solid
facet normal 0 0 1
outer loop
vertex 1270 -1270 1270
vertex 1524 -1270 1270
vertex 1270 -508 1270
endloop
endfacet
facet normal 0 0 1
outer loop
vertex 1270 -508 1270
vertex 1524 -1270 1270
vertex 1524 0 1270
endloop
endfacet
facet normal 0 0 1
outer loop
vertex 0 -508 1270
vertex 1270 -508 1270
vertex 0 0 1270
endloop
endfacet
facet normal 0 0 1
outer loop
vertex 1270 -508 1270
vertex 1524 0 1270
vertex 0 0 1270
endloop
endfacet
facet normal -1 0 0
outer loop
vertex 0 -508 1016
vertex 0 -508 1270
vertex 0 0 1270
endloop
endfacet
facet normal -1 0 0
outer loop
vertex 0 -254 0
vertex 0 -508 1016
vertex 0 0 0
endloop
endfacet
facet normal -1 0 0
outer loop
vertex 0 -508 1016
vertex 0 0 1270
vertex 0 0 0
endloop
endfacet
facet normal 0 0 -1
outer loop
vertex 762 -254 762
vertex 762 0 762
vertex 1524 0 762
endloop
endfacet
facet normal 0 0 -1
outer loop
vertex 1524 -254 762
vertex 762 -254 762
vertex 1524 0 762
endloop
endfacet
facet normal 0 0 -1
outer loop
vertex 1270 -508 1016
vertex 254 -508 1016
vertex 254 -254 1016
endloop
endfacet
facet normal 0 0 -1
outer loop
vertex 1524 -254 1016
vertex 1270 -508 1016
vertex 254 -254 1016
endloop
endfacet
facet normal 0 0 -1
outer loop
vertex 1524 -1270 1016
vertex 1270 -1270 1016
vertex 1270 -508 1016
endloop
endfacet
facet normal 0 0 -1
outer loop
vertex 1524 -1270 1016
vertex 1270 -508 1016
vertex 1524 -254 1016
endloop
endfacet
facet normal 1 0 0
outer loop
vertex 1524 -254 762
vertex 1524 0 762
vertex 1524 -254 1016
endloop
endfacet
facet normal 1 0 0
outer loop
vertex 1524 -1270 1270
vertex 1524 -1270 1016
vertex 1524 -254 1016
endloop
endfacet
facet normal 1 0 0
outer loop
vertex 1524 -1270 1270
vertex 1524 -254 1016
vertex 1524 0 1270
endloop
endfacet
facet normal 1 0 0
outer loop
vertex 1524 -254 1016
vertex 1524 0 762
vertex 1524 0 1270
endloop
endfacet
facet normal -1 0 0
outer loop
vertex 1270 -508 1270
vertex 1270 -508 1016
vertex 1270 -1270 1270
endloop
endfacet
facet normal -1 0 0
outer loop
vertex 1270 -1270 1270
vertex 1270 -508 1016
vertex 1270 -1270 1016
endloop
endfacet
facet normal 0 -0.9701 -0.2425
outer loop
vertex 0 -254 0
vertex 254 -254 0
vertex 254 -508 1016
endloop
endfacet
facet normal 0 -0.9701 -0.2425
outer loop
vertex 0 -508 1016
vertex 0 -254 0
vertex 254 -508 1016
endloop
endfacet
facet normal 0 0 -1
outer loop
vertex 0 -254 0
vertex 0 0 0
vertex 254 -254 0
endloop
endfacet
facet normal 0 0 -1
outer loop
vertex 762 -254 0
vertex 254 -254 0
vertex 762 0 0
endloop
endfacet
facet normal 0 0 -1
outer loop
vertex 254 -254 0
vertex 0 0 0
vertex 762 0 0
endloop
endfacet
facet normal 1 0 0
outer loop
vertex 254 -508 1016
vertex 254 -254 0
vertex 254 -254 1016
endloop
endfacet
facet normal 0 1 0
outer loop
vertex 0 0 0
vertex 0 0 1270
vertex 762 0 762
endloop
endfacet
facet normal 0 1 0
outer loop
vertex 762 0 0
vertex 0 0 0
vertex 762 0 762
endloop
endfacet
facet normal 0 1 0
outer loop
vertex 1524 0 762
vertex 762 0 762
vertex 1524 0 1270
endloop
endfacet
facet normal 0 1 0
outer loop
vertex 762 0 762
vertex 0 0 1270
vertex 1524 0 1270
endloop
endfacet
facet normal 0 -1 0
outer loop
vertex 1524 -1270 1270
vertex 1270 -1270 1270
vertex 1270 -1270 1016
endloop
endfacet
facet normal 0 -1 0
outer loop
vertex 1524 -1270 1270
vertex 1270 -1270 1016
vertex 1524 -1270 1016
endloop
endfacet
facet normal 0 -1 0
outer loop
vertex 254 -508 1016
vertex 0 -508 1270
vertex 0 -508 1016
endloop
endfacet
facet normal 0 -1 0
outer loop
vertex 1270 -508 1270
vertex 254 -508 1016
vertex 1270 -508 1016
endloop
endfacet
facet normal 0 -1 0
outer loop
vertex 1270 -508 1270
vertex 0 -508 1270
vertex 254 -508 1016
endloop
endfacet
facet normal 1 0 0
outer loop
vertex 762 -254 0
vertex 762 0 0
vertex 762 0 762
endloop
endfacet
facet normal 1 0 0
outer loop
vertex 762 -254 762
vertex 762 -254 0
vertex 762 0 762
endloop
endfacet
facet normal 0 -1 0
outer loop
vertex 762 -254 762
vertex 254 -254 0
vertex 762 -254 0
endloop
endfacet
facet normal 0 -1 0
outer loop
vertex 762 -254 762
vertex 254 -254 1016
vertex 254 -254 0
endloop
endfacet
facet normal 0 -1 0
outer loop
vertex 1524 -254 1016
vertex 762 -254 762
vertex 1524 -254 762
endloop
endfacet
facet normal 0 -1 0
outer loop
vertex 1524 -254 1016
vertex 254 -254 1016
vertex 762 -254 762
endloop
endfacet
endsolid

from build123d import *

# Parameters (mm, degrees)
F1_DEPTH  = 1270
F2_W      = 508
F2_H      = 762
F3_DEPTH  = 1016
F4_W      = 1270
F4_H      = 254
F5_DEPTH  = 1016
F7_DEPTH  = 254.001
F8_W      = 762
F8_H      = 762
F9_DEPTH  = 254.001
F10_W     = 508
F10_H     = 254
F11_DEPTH = 762
F12_W     = 254
F12_H     = 762
F13_DEPTH = 1016.001
F15_DEPTH = 254.001


with BuildPart() as f1:
    # F0 (on Front) → F1 (new body)
    with BuildSketch(Plane.XZ):
        Polygon((0, 1270), (0, 0), (762, 0), (762, 762), (1524, 762), (1524, 1270), align=None)
    extrude(amount=F1_DEPTH)

    # F2 (on face) → F3 (cut)
    with BuildSketch(Plane.XZ.offset(1270)):
        with Locations((508, 381)):
            Rectangle(F2_W, F2_H)
    extrude(amount=-F3_DEPTH, mode=Mode.SUBTRACT)

    # F4 (on face) → F5 (cut)
    with BuildSketch(Plane.XZ.offset(1270)):
        with Locations((889, 889)):
            Rectangle(F4_W, F4_H)
    extrude(amount=-F5_DEPTH, mode=Mode.SUBTRACT)

    # F6 (on face) → F7 (cut, through all)
    with BuildSketch(Plane.YZ.offset(254)):
        Polygon((-254, 0), (-1270, 1016), (-1270, 0), align=None)
    extrude(amount=-F7_DEPTH, mode=Mode.SUBTRACT)

    # F8 (on face) → F9 (cut, through all)
    with BuildSketch(Plane(origin=(0, 0, 1016), x_dir=(1, 0, 0), z_dir=(0, 0, -1))):
        with Locations((889, 889)):
            Rectangle(F8_W, F8_H)
    extrude(amount=-F9_DEPTH, mode=Mode.SUBTRACT)

    # F10 (on face) → F11 (cut)
    with BuildSketch(Plane.XZ.offset(1270)):
        with Locations((254, 1143)):
            Rectangle(F10_W, F10_H)
    extrude(amount=-F11_DEPTH, mode=Mode.SUBTRACT)

    # F12 (on face) → F13 (cut, through all)
    with BuildSketch(Plane.XY.offset(1016)):
        with Locations((127, -889)):
            Rectangle(F12_W, F12_H)
    extrude(amount=-F13_DEPTH, mode=Mode.SUBTRACT)

    # F14 (on face) → F15 (cut, through all)
    with BuildSketch(Plane.YZ.offset(254)):
        Polygon((-254, 0), (-508, 1016), (-508, 254), align=None)
    extrude(amount=-F15_DEPTH, mode=Mode.SUBTRACT)


solid = f1.part
